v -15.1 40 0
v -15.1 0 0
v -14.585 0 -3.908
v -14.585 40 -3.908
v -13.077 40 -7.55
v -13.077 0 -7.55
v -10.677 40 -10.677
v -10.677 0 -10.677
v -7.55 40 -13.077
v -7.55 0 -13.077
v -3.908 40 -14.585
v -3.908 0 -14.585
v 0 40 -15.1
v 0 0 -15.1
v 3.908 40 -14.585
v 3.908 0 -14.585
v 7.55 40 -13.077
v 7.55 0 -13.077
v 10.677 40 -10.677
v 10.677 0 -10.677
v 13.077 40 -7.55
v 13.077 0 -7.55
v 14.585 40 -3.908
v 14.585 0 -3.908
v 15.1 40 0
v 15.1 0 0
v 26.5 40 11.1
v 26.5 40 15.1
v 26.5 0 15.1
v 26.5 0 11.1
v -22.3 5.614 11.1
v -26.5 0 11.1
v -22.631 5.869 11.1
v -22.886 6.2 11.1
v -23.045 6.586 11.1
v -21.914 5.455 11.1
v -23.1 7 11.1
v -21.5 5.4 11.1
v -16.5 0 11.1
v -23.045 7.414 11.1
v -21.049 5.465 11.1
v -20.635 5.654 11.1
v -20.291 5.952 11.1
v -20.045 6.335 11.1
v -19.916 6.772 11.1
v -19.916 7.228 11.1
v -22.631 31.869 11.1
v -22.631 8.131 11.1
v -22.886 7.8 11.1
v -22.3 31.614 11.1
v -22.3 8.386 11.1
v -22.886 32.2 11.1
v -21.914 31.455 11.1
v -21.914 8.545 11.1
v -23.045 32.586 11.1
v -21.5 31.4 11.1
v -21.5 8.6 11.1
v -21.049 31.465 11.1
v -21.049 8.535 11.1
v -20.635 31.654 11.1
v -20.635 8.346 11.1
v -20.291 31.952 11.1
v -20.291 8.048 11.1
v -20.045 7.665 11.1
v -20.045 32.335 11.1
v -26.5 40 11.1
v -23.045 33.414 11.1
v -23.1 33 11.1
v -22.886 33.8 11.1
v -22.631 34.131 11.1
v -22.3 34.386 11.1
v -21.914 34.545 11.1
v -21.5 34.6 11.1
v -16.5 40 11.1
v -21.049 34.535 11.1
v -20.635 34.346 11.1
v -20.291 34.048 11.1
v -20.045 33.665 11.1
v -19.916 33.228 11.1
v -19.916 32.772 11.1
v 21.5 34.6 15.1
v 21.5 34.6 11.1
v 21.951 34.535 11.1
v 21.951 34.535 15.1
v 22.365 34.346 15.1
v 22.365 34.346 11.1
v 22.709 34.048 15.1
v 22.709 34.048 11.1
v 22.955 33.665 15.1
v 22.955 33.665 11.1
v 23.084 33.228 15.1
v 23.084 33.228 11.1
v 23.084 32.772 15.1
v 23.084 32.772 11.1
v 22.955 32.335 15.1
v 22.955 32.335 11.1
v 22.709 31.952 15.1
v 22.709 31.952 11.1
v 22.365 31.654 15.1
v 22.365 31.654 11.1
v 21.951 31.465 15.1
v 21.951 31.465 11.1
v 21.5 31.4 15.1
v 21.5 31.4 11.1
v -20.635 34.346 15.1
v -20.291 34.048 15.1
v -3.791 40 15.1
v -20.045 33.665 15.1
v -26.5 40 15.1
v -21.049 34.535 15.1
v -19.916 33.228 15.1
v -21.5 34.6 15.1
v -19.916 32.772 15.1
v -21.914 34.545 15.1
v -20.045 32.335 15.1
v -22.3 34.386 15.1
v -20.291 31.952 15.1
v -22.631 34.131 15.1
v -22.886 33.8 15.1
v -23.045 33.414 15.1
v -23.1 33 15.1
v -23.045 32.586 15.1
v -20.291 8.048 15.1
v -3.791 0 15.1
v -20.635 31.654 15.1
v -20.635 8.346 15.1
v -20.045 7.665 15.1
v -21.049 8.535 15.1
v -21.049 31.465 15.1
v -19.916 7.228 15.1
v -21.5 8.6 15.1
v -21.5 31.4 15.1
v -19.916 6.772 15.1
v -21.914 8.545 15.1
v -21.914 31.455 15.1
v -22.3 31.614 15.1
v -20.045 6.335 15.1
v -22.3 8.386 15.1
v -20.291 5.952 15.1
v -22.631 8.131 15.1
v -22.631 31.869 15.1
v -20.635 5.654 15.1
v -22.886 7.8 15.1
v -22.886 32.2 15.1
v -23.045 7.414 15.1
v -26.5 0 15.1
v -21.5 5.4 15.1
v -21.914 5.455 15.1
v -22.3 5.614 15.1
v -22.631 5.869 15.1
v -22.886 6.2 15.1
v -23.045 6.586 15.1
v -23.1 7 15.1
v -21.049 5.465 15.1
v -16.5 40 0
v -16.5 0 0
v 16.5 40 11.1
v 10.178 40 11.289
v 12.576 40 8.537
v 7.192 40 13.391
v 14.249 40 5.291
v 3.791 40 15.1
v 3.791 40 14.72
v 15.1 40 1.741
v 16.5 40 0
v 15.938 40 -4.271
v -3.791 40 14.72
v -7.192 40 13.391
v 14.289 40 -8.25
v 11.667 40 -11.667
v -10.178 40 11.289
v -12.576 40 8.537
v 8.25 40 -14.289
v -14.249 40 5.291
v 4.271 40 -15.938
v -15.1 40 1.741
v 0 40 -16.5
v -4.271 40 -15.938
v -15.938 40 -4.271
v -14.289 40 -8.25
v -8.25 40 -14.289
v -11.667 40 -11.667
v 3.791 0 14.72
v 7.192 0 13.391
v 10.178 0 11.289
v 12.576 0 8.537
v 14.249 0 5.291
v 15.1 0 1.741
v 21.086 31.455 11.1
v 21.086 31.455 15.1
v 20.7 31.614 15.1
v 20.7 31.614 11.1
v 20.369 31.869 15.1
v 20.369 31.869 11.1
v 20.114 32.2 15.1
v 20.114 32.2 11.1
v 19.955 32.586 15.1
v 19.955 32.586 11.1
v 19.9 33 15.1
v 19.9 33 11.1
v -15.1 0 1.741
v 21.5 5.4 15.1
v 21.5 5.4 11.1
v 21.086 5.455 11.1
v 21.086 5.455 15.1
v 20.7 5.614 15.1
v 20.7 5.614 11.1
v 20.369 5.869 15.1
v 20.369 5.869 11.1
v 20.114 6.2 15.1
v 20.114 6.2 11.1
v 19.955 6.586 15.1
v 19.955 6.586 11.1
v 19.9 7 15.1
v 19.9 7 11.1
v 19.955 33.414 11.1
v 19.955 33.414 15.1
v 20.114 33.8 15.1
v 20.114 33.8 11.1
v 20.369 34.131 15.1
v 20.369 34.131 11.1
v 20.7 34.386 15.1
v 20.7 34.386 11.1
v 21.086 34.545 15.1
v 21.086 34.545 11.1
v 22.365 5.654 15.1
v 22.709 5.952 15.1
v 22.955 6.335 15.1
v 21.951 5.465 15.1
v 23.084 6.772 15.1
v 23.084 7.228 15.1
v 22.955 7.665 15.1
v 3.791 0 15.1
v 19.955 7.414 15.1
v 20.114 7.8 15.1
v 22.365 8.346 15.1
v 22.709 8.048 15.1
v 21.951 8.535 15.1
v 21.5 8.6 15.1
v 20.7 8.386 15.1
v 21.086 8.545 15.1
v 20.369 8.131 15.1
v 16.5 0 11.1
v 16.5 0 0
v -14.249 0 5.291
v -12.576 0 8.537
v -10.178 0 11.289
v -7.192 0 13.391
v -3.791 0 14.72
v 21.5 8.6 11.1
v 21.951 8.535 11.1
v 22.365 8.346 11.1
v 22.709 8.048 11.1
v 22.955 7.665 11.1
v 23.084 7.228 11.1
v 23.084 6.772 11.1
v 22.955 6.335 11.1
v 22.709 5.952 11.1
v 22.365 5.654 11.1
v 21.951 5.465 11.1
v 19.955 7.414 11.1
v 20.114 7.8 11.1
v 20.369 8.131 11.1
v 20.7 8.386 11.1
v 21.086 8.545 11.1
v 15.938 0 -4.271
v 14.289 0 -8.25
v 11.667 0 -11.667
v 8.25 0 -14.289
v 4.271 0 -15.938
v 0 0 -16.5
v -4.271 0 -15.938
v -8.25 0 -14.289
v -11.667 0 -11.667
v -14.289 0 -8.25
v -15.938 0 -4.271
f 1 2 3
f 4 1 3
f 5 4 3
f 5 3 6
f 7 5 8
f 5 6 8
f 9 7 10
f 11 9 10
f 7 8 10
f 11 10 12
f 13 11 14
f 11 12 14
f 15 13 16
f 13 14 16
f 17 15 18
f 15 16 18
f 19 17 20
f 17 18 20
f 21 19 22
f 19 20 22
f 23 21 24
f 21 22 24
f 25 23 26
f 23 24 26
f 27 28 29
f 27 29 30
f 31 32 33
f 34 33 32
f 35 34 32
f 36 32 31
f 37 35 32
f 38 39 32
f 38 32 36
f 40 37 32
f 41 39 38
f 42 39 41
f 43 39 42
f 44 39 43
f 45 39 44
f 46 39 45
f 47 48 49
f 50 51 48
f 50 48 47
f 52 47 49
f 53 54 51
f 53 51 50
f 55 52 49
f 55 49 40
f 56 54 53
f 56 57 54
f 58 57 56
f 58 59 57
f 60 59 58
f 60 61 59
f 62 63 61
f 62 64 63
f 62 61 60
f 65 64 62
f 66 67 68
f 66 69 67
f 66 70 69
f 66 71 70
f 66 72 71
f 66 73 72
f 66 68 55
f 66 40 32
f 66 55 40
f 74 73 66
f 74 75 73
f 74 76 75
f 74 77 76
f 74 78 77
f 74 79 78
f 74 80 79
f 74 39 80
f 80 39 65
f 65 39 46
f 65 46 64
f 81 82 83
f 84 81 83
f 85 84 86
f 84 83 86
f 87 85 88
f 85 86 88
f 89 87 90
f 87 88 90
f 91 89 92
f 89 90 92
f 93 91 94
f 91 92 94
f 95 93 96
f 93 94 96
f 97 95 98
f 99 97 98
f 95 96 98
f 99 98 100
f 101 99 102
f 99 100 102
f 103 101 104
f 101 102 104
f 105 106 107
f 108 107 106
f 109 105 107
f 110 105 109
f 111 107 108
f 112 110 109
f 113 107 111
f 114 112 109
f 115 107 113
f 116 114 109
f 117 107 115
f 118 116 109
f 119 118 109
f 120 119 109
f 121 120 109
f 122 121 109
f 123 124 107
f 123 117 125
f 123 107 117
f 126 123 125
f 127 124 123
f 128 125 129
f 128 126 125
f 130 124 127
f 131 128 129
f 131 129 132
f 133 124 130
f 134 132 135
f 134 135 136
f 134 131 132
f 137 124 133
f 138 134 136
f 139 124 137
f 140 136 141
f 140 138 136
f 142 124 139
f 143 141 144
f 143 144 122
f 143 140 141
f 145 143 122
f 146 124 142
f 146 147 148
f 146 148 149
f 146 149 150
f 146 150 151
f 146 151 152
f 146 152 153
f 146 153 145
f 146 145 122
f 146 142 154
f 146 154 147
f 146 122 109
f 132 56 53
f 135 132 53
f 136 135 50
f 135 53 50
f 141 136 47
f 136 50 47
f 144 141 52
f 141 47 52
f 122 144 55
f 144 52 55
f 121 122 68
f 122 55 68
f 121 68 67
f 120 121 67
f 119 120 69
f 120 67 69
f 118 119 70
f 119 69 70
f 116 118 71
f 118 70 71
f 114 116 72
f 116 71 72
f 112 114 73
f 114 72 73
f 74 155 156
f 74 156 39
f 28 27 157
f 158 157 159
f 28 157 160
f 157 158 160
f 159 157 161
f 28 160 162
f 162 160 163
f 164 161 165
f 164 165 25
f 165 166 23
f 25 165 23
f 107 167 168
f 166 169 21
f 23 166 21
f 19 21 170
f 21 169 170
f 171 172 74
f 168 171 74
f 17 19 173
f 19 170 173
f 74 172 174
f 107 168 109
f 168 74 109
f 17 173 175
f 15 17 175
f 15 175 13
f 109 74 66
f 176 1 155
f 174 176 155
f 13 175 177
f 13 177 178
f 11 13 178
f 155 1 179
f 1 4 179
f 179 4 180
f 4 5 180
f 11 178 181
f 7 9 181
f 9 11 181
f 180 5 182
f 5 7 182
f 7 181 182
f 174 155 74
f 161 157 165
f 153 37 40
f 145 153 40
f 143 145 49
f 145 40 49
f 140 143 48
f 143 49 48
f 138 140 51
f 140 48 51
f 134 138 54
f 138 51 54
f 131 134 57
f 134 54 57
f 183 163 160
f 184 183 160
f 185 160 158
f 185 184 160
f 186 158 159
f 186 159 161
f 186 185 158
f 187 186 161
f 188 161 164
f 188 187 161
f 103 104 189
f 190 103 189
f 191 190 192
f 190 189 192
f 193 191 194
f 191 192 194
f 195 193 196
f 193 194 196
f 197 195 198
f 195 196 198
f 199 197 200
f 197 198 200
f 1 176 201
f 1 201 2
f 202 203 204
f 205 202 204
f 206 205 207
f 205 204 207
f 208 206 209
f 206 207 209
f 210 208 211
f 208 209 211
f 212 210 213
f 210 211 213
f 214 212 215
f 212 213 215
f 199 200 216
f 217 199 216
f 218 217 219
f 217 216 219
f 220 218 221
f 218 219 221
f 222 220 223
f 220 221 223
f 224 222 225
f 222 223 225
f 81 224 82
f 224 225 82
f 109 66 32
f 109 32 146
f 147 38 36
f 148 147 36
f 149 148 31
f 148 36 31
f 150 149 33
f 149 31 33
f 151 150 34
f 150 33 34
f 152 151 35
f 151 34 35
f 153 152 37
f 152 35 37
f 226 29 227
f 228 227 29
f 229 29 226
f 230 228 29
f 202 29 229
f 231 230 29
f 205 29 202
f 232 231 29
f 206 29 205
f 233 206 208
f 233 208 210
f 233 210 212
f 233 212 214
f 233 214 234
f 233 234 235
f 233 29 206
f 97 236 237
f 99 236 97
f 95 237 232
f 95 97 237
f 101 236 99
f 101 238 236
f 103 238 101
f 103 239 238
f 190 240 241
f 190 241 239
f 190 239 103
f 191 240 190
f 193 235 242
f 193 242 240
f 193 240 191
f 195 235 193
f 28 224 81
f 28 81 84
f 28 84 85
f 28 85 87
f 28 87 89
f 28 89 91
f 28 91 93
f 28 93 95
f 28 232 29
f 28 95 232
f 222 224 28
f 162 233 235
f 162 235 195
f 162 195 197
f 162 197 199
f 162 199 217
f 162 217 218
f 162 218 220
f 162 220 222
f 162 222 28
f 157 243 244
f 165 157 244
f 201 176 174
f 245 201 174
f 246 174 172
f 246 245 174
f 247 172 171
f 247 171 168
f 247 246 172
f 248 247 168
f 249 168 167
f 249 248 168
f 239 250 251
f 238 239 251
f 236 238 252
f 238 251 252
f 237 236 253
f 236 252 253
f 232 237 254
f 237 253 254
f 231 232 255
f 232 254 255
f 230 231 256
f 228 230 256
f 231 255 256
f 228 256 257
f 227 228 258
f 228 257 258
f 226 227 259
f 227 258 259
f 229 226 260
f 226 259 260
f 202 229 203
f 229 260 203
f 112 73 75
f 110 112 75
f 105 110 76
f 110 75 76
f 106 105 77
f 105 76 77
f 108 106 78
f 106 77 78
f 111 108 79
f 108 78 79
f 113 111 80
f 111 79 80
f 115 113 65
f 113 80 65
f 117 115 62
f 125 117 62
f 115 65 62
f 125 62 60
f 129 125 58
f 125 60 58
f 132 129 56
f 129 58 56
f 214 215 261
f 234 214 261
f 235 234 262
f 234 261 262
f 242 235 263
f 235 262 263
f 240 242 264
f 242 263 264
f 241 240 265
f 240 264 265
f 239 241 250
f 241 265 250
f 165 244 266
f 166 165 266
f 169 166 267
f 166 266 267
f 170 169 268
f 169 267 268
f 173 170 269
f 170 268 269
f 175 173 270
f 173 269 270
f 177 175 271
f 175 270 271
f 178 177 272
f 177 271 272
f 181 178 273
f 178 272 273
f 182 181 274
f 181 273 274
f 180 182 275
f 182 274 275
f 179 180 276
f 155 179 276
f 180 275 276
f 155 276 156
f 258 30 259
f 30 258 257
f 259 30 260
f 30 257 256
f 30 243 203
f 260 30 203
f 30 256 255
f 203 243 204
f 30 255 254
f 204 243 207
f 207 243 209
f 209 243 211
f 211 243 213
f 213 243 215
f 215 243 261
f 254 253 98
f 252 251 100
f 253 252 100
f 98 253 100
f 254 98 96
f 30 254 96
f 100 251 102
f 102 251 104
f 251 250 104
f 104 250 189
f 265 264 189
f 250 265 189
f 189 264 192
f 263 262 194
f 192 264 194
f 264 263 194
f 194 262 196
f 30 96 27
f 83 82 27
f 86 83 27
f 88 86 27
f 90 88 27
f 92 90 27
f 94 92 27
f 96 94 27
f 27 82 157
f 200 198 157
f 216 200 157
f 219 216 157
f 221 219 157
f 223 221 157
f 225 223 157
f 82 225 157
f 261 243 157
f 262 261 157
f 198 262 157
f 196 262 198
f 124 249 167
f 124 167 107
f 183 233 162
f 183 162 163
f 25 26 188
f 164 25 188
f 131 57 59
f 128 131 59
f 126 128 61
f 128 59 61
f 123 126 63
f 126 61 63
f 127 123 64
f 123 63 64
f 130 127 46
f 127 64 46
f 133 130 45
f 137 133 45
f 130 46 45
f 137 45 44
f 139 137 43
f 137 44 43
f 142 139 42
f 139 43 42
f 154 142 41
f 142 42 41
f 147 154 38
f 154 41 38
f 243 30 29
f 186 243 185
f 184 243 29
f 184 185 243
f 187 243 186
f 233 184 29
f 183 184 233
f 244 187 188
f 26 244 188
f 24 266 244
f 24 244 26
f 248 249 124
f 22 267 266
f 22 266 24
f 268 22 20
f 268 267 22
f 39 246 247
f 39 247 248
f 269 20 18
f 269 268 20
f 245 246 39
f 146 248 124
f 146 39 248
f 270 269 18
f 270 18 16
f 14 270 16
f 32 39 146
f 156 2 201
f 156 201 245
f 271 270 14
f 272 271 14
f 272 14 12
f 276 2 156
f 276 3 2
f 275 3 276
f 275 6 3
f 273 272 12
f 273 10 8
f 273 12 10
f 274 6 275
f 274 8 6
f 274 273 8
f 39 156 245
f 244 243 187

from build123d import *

# Parameters (mm, degrees)
BOSS_EXTRUDE3_DEPTH = 40
SKETCH8_W           = 4
SKETCH8_H           = 40
BOSS_EXTRUDE6_DEPTH = 10
SKETCH9_W           = 4
SKETCH9_H           = 40
BOSS_EXTRUDE7_DEPTH = 10
BOSS_EXTRUDE9_DEPTH = 40
CUT_EXTRUDE1_DEPTH  = 40


with BuildPart() as part:
    # Sketch3 → Boss-Extrude3 (new body)
    with BuildSketch(Plane(origin=(0, 0, 0), x_dir=(1, 0, 0), z_dir=(0, 1, 0))):
        with BuildLine():
            ThreePointArc((16.5, 0), (0, 16.5), (-16.5, 0))
            Line((-16.5, 0), (-16.5, -15.1))
            Line((-16.5, -15.1), (-15.1, -15.1))
            Line((-15.1, -15.1), (-15.1, 0))
            ThreePointArc((-15.1, 0), (0, 15.1), (15.1, 0))
            Line((15.1, 0), (15.1, -15.1))
            Line((15.1, -15.1), (16.5, -15.1))
            Line((16.5, -15.1), (16.5, 0))
        make_face()
    extrude(amount=BOSS_EXTRUDE3_DEPTH)

    # Sketch8 → Boss-Extrude6 (add)
    with BuildSketch(Plane(origin=(16.5, 0, 0), x_dir=(0, 0, -1), z_dir=(1, 0, 0))):
        with Locations((-13.1, 20)):
            Rectangle(SKETCH8_W, SKETCH8_H)
    extrude(amount=BOSS_EXTRUDE6_DEPTH)

    # Sketch9 → Boss-Extrude7 (add)
    with BuildSketch(Plane.ZY.offset(16.5)):
        with Locations((13.1, 20)):
            Rectangle(SKETCH9_W, SKETCH9_H)
    extrude(amount=BOSS_EXTRUDE7_DEPTH)

    # Sketch10 → Boss-Extrude9 (add)
    with BuildSketch(Plane(origin=(0, 0, 0), x_dir=(-1, 0, 0), z_dir=(0, -1, 0))):
        with BuildLine():
            Line((3.791332709, -15.1), (15.1, -15.1))
            Line((15.1, -15.1), (15.1, -1.740689519))
            ThreePointArc((15.1, -1.740689519), (11.460081139, -9.985316234), (3.791332709, -14.719571879))
            Line((3.791332709, -14.719571879), (3.791332709, -15.1))
        make_face()
        with BuildLine():
            Line((-15.1, -15.1), (-3.791332709, -15.1))
            Line((-3.791332709, -15.1), (-3.791332709, -14.719571879))
            ThreePointArc((-3.791332709, -14.719571879), (-11.460081139, -9.985316234), (-15.1, -1.740689519))
            Line((-15.1, -1.740689519), (-15.1, -15.1))
        make_face()
    extrude(amount=-BOSS_EXTRUDE9_DEPTH)

    # Sketch11 → Cut-Extrude1 (cut)
    with BuildSketch(Plane(origin=(0, 0, 11.1), x_dir=(-1, 0, 0), z_dir=(0, 0, -1))):
        with BuildLine():
            ThreePointArc((-19.9, 33), (-20.36862915, 34.13137085), (-21.5, 34.6))
            Line((-21.5, 34.6), (-21.5, 31.4))
            ThreePointArc((-21.5, 31.4), (-20.36862915, 31.86862915), (-19.9, 33))
        make_face()
        with BuildLine():
            Line((-21.5, 31.4), (-21.5, 34.6))
            ThreePointArc((-21.5, 34.6), (-23.1, 33), (-21.5, 31.4))
        make_face()
        with BuildLine():
            ThreePointArc((-19.9, 7), (-20.36862915, 8.13137085), (-21.5, 8.6))
            Line((-21.5, 8.6), (-21.5, 5.4))
            ThreePointArc((-21.5, 5.4), (-20.36862915, 5.86862915), (-19.9, 7))
        make_face()
        with BuildLine():
            Line((-21.5, 5.4), (-21.5, 8.6))
            ThreePointArc((-21.5, 8.6), (-23.1, 7), (-21.5, 5.4))
        make_face()
        with BuildLine():
            ThreePointArc((23.1, 7), (22.63137085, 8.13137085), (21.5, 8.6))
            Line((21.5, 8.6), (21.5, 5.4))
            ThreePointArc((21.5, 5.4), (22.63137085, 5.86862915), (23.1, 7))
        make_face()
        with BuildLine():
            Line((21.5, 5.4), (21.5, 8.6))
            ThreePointArc((21.5, 8.6), (19.9, 7), (21.5, 5.4))
        make_face()
        with BuildLine():
            ThreePointArc((23.1, 33), (22.63137085, 34.13137085), (21.5, 34.6))
            Line((21.5, 34.6), (21.5, 31.4))
            ThreePointArc((21.5, 31.4), (22.63137085, 31.86862915), (23.1, 33))
        make_face()
        with BuildLine():
            Line((21.5, 31.4), (21.5, 34.6))
            ThreePointArc((21.5, 34.6), (19.9, 33), (21.5, 31.4))
        make_face()
    extrude(amount=-CUT_EXTRUDE1_DEPTH, mode=Mode.SUBTRACT)


solid = part.part
